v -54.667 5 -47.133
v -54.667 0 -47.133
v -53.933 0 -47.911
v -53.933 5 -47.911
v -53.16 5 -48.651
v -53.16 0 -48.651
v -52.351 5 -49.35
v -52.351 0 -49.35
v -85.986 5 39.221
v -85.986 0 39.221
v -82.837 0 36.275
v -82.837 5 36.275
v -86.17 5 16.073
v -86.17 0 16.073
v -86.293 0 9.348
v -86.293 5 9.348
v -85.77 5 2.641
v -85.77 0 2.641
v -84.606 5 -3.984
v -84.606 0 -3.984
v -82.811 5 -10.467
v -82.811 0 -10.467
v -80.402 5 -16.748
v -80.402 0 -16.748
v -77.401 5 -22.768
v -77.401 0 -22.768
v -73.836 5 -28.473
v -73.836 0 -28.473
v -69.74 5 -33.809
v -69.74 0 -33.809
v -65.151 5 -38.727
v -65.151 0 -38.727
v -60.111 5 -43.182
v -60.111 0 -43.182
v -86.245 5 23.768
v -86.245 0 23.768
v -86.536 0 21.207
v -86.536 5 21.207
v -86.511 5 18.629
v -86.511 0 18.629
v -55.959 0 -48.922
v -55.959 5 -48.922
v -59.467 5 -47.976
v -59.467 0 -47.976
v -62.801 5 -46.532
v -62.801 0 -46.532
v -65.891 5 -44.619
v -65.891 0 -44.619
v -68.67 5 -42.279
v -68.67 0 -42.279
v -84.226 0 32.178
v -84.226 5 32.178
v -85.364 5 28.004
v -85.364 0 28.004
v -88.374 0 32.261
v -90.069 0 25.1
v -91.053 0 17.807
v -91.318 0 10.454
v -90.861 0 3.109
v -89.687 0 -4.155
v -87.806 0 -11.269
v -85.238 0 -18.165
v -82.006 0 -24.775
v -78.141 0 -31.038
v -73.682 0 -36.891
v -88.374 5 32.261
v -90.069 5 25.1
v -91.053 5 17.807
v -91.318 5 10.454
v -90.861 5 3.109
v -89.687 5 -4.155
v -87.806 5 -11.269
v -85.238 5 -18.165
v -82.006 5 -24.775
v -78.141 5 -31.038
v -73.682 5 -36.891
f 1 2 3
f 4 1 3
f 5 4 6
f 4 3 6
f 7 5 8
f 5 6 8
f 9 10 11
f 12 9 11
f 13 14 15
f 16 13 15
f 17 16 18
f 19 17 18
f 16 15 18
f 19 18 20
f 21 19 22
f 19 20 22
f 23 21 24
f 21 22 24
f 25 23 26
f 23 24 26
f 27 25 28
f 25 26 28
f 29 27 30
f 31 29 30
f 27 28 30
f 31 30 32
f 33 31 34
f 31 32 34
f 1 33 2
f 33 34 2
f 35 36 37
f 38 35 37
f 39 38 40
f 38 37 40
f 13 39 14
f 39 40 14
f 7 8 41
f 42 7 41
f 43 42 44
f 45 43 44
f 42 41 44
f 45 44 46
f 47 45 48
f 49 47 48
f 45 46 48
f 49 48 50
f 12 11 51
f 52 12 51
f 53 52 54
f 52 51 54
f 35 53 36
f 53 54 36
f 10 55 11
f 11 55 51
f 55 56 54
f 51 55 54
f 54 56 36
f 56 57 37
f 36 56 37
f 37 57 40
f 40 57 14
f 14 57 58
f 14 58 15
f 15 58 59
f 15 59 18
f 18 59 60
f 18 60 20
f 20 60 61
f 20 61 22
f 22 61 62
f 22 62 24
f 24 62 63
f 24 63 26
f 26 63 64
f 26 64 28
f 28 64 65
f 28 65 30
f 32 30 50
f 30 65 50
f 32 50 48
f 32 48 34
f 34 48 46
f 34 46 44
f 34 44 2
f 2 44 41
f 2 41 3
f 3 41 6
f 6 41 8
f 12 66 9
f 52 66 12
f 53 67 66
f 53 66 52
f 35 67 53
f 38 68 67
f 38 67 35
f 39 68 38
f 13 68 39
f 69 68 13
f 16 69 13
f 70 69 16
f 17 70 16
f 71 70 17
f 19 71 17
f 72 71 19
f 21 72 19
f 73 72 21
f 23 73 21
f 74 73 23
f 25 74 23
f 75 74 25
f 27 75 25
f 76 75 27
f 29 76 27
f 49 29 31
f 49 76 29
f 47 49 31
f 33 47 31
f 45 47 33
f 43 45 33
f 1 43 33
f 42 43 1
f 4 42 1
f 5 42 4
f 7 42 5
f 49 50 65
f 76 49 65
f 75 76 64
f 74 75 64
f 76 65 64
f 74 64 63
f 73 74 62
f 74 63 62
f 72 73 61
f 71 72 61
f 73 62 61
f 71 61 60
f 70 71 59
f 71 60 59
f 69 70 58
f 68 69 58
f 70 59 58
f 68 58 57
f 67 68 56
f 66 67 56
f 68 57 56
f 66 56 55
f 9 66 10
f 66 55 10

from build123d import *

# Parameters (mm, degrees)
BOSS_EXTRU_1_DEPTH = 5


with BuildPart() as part:
    # Esquisse1 → Boss.-Extru.1 (new body)
    with BuildSketch(Plane(origin=(0, 0, 0), x_dir=(1, 0, 0), z_dir=(0, 1, 0))):
        with BuildLine():
            Line((-85.986477301, -39.220909897), (-82.836538311, -36.274742561))
            ThreePointArc((-82.836538311, -36.274742561), (-84.826589539, -30.099452785), (-86.244619049, -23.768283856))
            ThreePointArc((-86.244619049, -23.768283856), (-86.563047935, -19.917311272), (-86.17049139, -16.073187685))
            ThreePointArc((-86.17049139, -16.073187685), (-78.973775537, 19.793847734), (-54.666943907, 47.13273734))
            ThreePointArc((-54.666943907, 47.13273734), (-53.551106318, 48.285581279), (-52.350511604, 49.349872124))
            ThreePointArc((-52.350511604, 49.349872124), (-61.160452612, 47.314883556), (-68.670306383, 42.279177512))
            ThreePointArc((-68.670306383, 42.279177512), (-89.686895205, 4.154921869), (-85.986477301, -39.220909897))
        make_face()
    extrude(amount=BOSS_EXTRU_1_DEPTH)


solid = part.part
